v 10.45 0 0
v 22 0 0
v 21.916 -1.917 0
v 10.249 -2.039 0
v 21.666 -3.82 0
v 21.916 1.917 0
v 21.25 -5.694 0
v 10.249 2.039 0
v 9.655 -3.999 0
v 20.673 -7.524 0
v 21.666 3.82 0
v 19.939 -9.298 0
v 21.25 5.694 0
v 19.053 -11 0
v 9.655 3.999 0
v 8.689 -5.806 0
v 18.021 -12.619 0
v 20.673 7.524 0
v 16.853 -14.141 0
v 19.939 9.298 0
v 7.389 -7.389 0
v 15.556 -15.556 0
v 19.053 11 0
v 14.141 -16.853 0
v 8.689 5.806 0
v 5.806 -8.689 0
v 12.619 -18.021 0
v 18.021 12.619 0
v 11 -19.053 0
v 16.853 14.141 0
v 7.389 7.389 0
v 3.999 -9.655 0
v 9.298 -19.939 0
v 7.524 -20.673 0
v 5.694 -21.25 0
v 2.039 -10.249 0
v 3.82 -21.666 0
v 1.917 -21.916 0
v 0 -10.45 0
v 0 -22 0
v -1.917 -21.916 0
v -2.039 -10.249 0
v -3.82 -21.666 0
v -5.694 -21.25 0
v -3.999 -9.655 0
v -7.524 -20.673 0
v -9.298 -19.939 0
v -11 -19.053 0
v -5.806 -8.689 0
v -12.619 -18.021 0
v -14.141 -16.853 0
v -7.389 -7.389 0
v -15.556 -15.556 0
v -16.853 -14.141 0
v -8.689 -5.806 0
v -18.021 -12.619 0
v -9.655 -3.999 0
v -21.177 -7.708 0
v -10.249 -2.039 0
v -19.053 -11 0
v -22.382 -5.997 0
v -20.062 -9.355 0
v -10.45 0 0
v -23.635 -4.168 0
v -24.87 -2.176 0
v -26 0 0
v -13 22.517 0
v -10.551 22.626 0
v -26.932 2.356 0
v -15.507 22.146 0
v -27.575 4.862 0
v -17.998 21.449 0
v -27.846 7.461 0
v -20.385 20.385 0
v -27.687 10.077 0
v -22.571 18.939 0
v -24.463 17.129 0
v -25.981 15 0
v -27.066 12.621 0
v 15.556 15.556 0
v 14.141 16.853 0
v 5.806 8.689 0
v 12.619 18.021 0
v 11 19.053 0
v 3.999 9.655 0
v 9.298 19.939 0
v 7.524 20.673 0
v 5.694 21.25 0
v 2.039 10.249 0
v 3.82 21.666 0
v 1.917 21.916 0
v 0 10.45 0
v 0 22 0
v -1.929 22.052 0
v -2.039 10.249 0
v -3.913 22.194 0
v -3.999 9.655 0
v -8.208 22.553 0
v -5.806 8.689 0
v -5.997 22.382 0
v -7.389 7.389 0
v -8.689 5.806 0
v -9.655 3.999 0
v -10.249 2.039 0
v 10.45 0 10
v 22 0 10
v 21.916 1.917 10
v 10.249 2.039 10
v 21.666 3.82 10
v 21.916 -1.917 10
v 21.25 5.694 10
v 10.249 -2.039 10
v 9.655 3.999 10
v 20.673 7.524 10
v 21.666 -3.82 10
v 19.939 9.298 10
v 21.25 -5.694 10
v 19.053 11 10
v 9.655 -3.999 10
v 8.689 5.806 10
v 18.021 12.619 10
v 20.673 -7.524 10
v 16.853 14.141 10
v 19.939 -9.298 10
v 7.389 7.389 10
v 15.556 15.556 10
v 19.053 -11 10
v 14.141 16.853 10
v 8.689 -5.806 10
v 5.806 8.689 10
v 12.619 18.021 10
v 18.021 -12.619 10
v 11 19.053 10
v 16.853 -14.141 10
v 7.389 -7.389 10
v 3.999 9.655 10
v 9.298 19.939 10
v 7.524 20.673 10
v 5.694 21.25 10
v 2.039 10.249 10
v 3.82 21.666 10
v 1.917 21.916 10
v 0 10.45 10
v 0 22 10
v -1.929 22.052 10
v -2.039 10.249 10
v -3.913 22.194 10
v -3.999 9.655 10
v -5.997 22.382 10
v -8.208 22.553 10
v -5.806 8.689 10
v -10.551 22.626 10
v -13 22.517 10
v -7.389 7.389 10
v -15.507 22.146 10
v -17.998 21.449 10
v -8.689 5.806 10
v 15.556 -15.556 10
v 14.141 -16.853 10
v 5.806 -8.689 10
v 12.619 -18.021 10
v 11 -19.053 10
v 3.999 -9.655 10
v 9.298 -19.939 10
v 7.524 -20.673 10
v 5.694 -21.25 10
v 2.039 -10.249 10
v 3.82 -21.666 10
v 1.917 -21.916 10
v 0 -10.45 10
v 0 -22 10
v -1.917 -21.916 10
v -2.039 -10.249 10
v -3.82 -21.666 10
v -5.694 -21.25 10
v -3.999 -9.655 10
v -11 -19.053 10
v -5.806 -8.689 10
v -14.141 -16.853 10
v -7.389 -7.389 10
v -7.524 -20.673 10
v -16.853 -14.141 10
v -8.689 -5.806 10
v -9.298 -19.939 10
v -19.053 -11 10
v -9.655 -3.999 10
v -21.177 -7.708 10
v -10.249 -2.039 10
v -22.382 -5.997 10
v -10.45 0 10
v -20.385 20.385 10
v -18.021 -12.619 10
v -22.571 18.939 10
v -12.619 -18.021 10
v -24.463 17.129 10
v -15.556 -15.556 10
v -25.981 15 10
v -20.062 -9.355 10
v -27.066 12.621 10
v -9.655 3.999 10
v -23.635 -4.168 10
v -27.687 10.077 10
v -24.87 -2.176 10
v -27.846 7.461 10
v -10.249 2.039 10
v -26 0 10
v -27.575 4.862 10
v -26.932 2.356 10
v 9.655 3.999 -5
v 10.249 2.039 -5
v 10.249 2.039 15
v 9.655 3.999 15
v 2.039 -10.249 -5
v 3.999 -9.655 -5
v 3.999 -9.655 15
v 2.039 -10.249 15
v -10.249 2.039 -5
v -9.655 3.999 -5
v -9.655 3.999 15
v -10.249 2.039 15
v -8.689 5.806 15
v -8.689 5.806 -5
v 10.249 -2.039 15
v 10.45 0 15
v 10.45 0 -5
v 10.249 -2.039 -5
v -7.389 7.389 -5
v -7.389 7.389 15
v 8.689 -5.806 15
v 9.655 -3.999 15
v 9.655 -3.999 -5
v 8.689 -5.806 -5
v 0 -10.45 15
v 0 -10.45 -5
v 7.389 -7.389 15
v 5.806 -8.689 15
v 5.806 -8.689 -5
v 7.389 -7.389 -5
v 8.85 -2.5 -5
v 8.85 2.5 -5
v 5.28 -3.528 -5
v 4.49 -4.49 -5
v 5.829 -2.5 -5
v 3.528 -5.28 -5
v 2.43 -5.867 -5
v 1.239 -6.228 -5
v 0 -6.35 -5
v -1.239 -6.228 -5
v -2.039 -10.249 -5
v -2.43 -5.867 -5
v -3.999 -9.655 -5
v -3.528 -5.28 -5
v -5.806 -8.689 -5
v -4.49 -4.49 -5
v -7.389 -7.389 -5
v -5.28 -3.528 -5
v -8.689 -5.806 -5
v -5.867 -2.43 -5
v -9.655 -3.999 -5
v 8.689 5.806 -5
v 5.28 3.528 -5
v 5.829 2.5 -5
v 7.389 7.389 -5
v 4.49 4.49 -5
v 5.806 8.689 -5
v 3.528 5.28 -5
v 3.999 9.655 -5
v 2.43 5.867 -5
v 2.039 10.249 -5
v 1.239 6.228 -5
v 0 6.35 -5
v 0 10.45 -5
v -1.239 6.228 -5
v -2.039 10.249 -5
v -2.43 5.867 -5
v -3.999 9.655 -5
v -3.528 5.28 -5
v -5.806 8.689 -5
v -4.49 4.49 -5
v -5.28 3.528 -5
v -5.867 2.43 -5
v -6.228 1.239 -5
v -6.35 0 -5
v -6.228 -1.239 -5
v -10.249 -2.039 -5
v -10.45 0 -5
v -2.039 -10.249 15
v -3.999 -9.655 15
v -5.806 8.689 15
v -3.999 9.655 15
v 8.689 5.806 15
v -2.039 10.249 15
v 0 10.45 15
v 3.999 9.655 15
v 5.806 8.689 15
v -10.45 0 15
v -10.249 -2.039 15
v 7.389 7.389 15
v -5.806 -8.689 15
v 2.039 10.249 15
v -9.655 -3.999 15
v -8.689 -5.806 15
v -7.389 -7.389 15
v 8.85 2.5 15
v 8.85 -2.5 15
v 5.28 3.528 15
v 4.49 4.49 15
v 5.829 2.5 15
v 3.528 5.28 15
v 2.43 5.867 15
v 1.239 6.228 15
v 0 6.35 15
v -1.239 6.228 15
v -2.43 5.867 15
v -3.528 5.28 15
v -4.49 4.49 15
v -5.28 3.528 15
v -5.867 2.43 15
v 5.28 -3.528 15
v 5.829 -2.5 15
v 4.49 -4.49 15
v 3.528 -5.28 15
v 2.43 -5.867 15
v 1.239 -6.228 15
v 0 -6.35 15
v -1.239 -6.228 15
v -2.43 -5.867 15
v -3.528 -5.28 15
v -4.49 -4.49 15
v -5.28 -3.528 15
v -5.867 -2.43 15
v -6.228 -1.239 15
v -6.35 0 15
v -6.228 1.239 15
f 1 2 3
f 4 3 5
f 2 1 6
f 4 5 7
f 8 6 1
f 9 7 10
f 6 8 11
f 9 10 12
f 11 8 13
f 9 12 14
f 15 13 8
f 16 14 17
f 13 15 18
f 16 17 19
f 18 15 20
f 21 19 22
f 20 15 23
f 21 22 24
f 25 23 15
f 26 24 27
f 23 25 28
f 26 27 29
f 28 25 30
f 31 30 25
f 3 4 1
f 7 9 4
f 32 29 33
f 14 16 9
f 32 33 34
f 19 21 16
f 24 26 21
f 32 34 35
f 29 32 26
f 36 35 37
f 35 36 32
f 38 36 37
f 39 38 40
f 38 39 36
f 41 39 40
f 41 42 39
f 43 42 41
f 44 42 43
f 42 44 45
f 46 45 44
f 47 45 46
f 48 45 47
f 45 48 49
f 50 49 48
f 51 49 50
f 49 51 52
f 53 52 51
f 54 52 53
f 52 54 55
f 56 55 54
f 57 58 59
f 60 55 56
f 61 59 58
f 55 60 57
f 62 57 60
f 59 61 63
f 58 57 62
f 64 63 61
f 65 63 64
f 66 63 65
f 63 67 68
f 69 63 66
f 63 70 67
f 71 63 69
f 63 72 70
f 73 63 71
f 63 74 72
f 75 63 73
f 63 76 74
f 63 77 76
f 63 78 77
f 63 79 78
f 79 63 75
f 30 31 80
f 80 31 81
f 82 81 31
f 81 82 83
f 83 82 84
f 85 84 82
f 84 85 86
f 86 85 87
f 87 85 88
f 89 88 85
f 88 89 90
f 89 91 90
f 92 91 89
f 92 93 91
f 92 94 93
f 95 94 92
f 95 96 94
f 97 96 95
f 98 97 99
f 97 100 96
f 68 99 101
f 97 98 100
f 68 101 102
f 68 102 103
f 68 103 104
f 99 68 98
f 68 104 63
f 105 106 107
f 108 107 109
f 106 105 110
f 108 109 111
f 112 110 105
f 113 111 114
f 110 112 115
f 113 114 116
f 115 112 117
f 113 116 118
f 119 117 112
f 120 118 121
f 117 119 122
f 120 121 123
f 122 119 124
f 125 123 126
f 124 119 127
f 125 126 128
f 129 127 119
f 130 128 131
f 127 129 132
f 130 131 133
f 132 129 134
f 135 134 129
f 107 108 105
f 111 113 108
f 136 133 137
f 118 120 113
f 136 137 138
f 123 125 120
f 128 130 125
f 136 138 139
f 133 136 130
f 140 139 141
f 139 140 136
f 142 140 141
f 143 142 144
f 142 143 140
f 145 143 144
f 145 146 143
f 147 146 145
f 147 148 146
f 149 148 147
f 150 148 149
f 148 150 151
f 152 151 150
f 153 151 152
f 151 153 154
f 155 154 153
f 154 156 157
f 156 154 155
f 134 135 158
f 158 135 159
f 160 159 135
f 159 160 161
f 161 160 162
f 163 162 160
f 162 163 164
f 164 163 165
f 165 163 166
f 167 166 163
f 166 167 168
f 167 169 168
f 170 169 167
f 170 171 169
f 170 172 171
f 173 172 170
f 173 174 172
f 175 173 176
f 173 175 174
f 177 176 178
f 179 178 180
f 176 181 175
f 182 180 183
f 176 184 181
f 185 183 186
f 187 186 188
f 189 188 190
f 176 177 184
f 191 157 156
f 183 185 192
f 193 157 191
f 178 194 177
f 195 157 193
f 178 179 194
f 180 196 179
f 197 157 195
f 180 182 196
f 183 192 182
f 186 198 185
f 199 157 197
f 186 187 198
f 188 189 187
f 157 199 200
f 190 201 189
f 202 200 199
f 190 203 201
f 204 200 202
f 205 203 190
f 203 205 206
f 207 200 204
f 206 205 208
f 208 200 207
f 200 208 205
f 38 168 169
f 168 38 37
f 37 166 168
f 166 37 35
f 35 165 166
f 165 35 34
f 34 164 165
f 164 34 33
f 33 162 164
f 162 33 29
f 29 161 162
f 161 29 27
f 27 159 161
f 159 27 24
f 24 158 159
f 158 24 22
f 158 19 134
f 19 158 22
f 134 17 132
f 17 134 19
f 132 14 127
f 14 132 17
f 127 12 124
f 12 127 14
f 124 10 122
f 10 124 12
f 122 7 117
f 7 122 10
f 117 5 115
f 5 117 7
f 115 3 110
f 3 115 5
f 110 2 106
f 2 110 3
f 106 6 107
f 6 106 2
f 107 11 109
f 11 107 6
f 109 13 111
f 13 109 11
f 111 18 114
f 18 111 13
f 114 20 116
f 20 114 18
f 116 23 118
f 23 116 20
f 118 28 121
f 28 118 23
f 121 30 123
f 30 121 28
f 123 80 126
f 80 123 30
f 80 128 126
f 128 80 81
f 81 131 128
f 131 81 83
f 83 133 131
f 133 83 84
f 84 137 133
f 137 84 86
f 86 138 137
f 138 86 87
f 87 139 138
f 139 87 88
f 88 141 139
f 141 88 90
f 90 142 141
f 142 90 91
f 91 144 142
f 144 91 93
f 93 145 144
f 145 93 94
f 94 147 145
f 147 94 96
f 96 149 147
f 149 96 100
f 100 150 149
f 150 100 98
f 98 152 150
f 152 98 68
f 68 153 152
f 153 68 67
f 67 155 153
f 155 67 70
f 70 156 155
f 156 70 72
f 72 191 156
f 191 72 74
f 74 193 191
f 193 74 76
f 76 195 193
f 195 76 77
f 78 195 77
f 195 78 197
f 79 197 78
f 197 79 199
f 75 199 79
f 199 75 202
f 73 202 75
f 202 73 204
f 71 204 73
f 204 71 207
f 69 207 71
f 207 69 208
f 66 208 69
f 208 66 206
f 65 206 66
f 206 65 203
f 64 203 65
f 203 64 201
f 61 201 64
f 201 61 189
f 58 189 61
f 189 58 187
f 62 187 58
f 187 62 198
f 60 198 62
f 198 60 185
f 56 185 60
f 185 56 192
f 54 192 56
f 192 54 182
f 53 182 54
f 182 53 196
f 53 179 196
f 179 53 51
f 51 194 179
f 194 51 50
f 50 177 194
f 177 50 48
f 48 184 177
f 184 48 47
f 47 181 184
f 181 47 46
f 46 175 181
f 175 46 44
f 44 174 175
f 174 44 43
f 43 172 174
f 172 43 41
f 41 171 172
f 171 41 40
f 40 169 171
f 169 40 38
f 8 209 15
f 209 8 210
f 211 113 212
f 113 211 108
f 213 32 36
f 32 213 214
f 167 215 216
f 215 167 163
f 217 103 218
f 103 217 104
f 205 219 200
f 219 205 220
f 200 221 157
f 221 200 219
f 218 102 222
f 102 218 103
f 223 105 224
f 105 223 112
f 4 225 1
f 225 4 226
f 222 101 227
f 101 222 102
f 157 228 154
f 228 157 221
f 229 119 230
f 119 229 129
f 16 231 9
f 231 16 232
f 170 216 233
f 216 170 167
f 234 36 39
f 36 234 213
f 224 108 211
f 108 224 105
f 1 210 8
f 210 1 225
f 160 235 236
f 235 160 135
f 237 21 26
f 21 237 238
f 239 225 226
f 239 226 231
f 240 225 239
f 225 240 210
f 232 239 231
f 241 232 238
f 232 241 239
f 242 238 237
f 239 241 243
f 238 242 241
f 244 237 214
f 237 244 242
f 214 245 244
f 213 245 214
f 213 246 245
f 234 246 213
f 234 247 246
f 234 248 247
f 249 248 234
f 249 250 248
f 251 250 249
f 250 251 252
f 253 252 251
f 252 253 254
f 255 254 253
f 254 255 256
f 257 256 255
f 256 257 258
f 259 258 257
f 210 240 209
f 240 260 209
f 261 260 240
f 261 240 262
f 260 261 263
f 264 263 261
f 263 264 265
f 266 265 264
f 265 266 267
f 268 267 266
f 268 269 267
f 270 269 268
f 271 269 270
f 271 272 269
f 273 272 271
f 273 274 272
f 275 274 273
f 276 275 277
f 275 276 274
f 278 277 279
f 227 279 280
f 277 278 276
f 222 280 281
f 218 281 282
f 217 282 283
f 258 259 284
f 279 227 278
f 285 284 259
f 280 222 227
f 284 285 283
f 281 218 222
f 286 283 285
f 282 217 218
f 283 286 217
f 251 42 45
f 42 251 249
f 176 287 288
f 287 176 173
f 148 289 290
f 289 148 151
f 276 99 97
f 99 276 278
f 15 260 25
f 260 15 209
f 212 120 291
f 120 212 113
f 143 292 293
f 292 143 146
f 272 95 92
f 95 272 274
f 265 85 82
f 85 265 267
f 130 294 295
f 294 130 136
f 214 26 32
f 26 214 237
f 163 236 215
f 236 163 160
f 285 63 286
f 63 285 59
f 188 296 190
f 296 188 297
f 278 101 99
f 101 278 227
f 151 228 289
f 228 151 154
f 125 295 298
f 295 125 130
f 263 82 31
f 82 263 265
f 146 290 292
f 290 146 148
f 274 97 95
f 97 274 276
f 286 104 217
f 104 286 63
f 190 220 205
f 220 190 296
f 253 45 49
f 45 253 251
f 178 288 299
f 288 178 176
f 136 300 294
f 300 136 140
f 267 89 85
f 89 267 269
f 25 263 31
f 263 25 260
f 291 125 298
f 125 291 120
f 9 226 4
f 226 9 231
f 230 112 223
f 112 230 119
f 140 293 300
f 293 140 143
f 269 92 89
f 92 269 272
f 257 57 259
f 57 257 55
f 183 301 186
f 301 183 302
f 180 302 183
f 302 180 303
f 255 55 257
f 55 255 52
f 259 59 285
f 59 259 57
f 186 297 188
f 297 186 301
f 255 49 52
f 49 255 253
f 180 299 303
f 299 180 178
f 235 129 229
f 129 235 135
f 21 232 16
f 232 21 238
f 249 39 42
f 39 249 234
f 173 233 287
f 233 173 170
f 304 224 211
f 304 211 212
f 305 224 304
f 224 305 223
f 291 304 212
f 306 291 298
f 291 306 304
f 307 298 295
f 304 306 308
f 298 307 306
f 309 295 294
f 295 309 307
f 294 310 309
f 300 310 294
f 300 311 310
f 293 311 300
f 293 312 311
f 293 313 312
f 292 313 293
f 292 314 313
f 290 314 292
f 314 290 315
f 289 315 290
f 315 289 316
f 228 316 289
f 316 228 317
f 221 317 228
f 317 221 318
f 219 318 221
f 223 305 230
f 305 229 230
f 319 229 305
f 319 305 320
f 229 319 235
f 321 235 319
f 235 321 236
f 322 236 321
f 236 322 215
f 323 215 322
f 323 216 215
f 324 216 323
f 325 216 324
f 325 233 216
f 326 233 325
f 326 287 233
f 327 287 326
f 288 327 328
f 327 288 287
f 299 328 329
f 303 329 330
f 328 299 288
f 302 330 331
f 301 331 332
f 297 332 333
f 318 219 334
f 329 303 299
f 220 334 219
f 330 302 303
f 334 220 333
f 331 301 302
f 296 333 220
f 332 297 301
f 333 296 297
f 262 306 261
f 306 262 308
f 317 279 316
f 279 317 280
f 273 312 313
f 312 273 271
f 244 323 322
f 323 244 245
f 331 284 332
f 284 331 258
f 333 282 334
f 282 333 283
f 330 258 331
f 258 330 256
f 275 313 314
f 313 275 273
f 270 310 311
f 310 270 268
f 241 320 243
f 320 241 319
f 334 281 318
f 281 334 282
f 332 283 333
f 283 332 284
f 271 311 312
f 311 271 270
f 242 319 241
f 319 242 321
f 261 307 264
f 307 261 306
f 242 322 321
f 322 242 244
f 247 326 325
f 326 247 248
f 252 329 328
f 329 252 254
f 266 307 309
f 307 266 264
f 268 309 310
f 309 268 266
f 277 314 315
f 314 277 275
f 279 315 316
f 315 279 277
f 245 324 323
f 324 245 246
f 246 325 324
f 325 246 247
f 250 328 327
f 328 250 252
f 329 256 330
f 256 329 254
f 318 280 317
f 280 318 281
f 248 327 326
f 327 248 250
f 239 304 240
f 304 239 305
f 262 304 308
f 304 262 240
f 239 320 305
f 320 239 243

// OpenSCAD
$fn = 32;

// ----------------------------------------------------------------------
// Cam: base radius 22 mm with a 8 mm lift over 120 degrees
// ----------------------------------------------------------------------

// --- parameters (mm) ---
base_r = 22;              // base radius
lift = 8;                 // lift height above the base radius
lift_span = 120;          // angular width of the lift
lift_start = 90;          // angle where the lift starts
cam_t = 10;               // cam plate thickness
hub_d = 20.9;             // hub diameter
hub_h = 20;               // hub height
bore_d = 12.7;            // bore
key_w = 5;                // keyway width
key_depth = 2.1;          // keyway depth

cam_profile = [[22, 0], [21.916, 1.917], [21.666, 3.82], [21.25, 5.694], [20.673, 7.524], [19.939, 9.298], [19.053, 11], [18.021, 12.619], [16.853, 14.141], [15.556, 15.556], [14.141, 16.853], [12.619, 18.021], [11, 19.053], [9.298, 19.939], [7.524, 20.673], [5.694, 21.25], [3.82, 21.666], [1.917, 21.916], [0, 22], [-1.929, 22.052], [-3.913, 22.194], [-5.997, 22.382], [-8.208, 22.553], [-10.551, 22.626], [-13, 22.517], [-15.507, 22.146], [-17.998, 21.449], [-20.385, 20.385], [-22.571, 18.939], [-24.463, 17.129], [-25.981, 15], [-27.066, 12.621], [-27.687, 10.077], [-27.846, 7.461], [-27.575, 4.862], [-26.932, 2.356], [-26, 0], [-24.87, -2.176], [-23.635, -4.168], [-22.382, -5.997], [-21.177, -7.708], [-20.062, -9.355], [-19.053, -11], [-18.021, -12.619], [-16.853, -14.141], [-15.556, -15.556], [-14.141, -16.853], [-12.619, -18.021], [-11, -19.053], [-9.298, -19.939], [-7.524, -20.673], [-5.694, -21.25], [-3.82, -21.666], [-1.917, -21.916], [0, -22], [1.917, -21.916], [3.82, -21.666], [5.694, -21.25], [7.524, -20.673], [9.298, -19.939], [11, -19.053], [12.619, -18.021], [14.141, -16.853], [15.556, -15.556], [16.853, -14.141], [18.021, -12.619], [19.053, -11], [19.939, -9.298], [20.673, -7.524], [21.25, -5.694], [21.666, -3.82], [21.916, -1.917]];

difference() {
  union() {
    linear_extrude(height = cam_t) polygon(cam_profile);
    /* hub, proud of the cam plate on both sides */
    translate([0, 0, -5]) cylinder(h = hub_h, d = hub_d);
  }
  /* bore through the hub, 2.5 mm clear on both faces */
  translate([0, 0, -7.5]) cylinder(h = hub_h + 5, d = bore_d);
  /* keyway, milled through the whole hub */
  translate([4.25, -2.5, -7.5]) cube([4.6, 5, 25]);
}
